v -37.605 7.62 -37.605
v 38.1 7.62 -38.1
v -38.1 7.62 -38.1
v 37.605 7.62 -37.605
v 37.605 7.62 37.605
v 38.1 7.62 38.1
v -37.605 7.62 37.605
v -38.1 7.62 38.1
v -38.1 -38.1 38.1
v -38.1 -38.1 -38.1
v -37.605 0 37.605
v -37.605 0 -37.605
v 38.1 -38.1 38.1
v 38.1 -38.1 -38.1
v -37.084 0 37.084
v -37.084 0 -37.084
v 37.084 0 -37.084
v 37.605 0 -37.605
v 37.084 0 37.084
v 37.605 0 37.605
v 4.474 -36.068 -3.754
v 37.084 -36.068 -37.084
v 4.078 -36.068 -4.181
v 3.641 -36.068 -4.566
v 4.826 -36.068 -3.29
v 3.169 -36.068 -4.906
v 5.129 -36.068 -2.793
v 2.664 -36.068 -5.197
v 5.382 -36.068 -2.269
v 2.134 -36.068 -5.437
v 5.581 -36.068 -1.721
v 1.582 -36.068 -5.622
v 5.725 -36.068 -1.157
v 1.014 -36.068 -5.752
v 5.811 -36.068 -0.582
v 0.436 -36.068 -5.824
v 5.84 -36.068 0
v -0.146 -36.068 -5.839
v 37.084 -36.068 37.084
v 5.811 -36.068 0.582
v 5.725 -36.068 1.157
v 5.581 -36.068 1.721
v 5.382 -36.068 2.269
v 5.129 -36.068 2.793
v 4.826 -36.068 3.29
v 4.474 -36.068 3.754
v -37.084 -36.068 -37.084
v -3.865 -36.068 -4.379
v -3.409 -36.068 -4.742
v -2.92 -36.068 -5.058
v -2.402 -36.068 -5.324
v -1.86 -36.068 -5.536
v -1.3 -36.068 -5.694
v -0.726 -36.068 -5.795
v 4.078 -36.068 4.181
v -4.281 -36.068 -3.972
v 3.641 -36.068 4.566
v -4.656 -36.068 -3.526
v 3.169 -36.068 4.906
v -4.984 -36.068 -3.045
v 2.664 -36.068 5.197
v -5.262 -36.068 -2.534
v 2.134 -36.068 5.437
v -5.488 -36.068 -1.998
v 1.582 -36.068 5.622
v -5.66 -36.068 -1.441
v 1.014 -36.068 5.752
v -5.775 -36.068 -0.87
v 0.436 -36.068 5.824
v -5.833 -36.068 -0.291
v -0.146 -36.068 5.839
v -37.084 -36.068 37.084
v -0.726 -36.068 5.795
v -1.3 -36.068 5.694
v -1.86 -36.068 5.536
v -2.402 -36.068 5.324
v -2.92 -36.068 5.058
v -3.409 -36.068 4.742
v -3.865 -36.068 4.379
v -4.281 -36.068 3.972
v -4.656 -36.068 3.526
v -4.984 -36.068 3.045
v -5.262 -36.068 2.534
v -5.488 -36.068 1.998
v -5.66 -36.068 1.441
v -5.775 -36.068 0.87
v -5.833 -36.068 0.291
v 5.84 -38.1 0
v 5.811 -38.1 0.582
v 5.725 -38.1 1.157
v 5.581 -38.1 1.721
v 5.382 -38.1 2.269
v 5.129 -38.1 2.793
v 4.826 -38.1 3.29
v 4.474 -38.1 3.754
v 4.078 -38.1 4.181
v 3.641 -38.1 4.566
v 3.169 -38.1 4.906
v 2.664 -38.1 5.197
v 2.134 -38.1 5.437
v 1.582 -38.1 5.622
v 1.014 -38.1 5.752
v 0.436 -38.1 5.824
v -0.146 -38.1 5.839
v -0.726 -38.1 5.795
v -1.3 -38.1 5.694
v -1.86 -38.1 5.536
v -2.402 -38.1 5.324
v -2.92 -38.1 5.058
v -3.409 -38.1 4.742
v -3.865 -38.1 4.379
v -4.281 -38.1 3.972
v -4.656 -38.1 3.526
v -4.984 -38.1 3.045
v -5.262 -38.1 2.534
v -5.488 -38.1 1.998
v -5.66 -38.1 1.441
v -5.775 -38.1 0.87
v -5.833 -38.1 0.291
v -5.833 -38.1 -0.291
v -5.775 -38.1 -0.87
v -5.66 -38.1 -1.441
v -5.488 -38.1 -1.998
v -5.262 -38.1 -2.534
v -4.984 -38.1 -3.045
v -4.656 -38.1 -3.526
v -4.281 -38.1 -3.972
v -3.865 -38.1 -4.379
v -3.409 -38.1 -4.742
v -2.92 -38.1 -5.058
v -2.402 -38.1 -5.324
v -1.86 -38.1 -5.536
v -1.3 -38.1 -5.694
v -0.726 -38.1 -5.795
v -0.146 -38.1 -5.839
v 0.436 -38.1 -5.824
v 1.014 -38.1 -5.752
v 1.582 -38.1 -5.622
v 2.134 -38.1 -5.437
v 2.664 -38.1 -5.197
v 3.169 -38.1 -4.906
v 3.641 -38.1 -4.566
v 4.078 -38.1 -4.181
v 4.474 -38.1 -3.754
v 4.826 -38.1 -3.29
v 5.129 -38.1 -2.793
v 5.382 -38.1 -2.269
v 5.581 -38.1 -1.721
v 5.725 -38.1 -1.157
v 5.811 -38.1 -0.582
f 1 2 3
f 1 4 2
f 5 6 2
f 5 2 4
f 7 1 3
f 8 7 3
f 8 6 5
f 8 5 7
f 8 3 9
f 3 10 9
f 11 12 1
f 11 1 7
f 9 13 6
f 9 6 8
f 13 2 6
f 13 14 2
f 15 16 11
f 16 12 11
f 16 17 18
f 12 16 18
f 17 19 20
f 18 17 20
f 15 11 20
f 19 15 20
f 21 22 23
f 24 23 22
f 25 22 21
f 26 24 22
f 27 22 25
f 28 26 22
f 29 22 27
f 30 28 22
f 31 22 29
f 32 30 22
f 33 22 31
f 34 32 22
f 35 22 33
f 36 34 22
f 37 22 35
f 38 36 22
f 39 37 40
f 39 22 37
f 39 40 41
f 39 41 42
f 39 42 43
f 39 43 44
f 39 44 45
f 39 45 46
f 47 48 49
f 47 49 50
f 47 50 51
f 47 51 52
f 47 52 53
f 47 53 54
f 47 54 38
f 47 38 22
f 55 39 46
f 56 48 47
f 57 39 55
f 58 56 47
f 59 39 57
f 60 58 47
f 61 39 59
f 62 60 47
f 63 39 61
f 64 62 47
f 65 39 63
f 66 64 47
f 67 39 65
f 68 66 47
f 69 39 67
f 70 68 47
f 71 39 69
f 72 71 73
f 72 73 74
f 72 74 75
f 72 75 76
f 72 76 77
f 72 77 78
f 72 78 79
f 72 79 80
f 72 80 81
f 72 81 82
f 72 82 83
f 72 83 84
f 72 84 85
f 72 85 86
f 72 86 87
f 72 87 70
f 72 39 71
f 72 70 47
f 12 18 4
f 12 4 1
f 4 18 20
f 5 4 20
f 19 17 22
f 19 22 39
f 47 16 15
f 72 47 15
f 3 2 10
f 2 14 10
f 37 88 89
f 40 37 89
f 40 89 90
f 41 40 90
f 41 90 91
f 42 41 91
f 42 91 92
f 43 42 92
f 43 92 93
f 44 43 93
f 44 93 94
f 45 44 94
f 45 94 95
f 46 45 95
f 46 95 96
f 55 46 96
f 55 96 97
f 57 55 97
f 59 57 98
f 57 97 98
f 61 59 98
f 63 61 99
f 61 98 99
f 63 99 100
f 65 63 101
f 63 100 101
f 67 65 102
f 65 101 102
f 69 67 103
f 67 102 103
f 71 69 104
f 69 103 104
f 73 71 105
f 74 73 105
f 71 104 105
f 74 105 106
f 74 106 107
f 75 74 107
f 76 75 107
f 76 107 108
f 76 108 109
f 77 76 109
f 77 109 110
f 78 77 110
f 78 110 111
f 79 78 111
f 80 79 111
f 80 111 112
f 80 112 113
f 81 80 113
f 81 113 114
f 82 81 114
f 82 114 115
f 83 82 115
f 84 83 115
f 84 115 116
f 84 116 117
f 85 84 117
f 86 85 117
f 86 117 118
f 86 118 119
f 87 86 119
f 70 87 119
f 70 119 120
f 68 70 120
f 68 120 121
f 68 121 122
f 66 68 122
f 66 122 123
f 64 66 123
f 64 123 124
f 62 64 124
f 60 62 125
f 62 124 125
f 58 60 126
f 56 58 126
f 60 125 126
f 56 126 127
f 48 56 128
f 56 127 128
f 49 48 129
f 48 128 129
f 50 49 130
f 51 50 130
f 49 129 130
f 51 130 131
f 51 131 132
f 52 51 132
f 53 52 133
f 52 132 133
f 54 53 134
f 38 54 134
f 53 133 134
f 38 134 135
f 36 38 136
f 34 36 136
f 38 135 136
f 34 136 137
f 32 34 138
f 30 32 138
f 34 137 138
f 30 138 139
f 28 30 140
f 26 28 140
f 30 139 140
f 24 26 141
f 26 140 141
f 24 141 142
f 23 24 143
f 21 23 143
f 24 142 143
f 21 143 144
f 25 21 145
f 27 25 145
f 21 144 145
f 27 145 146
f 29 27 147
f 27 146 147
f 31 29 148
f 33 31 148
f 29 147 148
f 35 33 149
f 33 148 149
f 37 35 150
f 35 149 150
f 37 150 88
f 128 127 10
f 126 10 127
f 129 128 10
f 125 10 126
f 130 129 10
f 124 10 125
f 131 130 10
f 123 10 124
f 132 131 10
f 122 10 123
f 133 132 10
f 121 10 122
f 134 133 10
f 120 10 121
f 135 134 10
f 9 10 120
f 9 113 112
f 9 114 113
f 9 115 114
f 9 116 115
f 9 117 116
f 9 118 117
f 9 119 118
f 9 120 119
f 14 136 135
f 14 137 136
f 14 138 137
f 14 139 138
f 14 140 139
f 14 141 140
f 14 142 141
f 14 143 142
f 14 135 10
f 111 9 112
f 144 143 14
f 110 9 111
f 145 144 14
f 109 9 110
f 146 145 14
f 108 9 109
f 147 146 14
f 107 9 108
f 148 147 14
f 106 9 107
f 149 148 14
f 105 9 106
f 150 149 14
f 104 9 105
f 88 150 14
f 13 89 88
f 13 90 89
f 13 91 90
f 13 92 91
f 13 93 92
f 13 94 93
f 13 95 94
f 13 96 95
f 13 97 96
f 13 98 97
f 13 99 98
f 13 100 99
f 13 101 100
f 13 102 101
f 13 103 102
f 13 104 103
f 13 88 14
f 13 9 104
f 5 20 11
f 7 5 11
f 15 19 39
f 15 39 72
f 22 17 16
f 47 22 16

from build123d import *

# Parameters (mm, degrees)
F0_W     = 76.2
F0_H     = 76.2
F1_DEPTH = 38.1
F2_W     = 74.168
F2_H     = 74.168
F3_DEPTH = 36.068
F4_W     = 75.2094
F4_H     = 75.2094
F4_W_2   = 76.2
F4_H_2   = 76.2
F5_DEPTH = 7.62
F6_R     = 5.840403
F7_DEPTH = 12.7


with BuildPart() as f1:
    # F0 (on Front) → F1 (new body)
    with BuildSketch(Plane.XZ):
        Rectangle(F0_W, F0_H)
    extrude(amount=F1_DEPTH)

    # F2 (on face) → F3 (cut)
    with BuildSketch(Plane(origin=(0, 0, 0), x_dir=(-1, 0, 0), z_dir=(0, 1, 0))):
        Rectangle(F2_W, F2_H)
    extrude(amount=-F3_DEPTH, mode=Mode.SUBTRACT)

    # F4 (on face) → F5 (join)
    with BuildSketch(Plane(origin=(0, 0, 0), x_dir=(-1, 0, 0), z_dir=(0, 1, 0))):
        Rectangle(F4_W, F4_H)
        Rectangle(F4_W_2, F4_H_2)
        Rectangle(F4_W, F4_H, mode=Mode.SUBTRACT)
    extrude(amount=F5_DEPTH)

    # F6 (on face) → F7 (cut)
    with BuildSketch(Plane.XZ.offset(38.1)):
        Circle(F6_R)
    extrude(amount=-F7_DEPTH, mode=Mode.SUBTRACT)


solid = f1.part
